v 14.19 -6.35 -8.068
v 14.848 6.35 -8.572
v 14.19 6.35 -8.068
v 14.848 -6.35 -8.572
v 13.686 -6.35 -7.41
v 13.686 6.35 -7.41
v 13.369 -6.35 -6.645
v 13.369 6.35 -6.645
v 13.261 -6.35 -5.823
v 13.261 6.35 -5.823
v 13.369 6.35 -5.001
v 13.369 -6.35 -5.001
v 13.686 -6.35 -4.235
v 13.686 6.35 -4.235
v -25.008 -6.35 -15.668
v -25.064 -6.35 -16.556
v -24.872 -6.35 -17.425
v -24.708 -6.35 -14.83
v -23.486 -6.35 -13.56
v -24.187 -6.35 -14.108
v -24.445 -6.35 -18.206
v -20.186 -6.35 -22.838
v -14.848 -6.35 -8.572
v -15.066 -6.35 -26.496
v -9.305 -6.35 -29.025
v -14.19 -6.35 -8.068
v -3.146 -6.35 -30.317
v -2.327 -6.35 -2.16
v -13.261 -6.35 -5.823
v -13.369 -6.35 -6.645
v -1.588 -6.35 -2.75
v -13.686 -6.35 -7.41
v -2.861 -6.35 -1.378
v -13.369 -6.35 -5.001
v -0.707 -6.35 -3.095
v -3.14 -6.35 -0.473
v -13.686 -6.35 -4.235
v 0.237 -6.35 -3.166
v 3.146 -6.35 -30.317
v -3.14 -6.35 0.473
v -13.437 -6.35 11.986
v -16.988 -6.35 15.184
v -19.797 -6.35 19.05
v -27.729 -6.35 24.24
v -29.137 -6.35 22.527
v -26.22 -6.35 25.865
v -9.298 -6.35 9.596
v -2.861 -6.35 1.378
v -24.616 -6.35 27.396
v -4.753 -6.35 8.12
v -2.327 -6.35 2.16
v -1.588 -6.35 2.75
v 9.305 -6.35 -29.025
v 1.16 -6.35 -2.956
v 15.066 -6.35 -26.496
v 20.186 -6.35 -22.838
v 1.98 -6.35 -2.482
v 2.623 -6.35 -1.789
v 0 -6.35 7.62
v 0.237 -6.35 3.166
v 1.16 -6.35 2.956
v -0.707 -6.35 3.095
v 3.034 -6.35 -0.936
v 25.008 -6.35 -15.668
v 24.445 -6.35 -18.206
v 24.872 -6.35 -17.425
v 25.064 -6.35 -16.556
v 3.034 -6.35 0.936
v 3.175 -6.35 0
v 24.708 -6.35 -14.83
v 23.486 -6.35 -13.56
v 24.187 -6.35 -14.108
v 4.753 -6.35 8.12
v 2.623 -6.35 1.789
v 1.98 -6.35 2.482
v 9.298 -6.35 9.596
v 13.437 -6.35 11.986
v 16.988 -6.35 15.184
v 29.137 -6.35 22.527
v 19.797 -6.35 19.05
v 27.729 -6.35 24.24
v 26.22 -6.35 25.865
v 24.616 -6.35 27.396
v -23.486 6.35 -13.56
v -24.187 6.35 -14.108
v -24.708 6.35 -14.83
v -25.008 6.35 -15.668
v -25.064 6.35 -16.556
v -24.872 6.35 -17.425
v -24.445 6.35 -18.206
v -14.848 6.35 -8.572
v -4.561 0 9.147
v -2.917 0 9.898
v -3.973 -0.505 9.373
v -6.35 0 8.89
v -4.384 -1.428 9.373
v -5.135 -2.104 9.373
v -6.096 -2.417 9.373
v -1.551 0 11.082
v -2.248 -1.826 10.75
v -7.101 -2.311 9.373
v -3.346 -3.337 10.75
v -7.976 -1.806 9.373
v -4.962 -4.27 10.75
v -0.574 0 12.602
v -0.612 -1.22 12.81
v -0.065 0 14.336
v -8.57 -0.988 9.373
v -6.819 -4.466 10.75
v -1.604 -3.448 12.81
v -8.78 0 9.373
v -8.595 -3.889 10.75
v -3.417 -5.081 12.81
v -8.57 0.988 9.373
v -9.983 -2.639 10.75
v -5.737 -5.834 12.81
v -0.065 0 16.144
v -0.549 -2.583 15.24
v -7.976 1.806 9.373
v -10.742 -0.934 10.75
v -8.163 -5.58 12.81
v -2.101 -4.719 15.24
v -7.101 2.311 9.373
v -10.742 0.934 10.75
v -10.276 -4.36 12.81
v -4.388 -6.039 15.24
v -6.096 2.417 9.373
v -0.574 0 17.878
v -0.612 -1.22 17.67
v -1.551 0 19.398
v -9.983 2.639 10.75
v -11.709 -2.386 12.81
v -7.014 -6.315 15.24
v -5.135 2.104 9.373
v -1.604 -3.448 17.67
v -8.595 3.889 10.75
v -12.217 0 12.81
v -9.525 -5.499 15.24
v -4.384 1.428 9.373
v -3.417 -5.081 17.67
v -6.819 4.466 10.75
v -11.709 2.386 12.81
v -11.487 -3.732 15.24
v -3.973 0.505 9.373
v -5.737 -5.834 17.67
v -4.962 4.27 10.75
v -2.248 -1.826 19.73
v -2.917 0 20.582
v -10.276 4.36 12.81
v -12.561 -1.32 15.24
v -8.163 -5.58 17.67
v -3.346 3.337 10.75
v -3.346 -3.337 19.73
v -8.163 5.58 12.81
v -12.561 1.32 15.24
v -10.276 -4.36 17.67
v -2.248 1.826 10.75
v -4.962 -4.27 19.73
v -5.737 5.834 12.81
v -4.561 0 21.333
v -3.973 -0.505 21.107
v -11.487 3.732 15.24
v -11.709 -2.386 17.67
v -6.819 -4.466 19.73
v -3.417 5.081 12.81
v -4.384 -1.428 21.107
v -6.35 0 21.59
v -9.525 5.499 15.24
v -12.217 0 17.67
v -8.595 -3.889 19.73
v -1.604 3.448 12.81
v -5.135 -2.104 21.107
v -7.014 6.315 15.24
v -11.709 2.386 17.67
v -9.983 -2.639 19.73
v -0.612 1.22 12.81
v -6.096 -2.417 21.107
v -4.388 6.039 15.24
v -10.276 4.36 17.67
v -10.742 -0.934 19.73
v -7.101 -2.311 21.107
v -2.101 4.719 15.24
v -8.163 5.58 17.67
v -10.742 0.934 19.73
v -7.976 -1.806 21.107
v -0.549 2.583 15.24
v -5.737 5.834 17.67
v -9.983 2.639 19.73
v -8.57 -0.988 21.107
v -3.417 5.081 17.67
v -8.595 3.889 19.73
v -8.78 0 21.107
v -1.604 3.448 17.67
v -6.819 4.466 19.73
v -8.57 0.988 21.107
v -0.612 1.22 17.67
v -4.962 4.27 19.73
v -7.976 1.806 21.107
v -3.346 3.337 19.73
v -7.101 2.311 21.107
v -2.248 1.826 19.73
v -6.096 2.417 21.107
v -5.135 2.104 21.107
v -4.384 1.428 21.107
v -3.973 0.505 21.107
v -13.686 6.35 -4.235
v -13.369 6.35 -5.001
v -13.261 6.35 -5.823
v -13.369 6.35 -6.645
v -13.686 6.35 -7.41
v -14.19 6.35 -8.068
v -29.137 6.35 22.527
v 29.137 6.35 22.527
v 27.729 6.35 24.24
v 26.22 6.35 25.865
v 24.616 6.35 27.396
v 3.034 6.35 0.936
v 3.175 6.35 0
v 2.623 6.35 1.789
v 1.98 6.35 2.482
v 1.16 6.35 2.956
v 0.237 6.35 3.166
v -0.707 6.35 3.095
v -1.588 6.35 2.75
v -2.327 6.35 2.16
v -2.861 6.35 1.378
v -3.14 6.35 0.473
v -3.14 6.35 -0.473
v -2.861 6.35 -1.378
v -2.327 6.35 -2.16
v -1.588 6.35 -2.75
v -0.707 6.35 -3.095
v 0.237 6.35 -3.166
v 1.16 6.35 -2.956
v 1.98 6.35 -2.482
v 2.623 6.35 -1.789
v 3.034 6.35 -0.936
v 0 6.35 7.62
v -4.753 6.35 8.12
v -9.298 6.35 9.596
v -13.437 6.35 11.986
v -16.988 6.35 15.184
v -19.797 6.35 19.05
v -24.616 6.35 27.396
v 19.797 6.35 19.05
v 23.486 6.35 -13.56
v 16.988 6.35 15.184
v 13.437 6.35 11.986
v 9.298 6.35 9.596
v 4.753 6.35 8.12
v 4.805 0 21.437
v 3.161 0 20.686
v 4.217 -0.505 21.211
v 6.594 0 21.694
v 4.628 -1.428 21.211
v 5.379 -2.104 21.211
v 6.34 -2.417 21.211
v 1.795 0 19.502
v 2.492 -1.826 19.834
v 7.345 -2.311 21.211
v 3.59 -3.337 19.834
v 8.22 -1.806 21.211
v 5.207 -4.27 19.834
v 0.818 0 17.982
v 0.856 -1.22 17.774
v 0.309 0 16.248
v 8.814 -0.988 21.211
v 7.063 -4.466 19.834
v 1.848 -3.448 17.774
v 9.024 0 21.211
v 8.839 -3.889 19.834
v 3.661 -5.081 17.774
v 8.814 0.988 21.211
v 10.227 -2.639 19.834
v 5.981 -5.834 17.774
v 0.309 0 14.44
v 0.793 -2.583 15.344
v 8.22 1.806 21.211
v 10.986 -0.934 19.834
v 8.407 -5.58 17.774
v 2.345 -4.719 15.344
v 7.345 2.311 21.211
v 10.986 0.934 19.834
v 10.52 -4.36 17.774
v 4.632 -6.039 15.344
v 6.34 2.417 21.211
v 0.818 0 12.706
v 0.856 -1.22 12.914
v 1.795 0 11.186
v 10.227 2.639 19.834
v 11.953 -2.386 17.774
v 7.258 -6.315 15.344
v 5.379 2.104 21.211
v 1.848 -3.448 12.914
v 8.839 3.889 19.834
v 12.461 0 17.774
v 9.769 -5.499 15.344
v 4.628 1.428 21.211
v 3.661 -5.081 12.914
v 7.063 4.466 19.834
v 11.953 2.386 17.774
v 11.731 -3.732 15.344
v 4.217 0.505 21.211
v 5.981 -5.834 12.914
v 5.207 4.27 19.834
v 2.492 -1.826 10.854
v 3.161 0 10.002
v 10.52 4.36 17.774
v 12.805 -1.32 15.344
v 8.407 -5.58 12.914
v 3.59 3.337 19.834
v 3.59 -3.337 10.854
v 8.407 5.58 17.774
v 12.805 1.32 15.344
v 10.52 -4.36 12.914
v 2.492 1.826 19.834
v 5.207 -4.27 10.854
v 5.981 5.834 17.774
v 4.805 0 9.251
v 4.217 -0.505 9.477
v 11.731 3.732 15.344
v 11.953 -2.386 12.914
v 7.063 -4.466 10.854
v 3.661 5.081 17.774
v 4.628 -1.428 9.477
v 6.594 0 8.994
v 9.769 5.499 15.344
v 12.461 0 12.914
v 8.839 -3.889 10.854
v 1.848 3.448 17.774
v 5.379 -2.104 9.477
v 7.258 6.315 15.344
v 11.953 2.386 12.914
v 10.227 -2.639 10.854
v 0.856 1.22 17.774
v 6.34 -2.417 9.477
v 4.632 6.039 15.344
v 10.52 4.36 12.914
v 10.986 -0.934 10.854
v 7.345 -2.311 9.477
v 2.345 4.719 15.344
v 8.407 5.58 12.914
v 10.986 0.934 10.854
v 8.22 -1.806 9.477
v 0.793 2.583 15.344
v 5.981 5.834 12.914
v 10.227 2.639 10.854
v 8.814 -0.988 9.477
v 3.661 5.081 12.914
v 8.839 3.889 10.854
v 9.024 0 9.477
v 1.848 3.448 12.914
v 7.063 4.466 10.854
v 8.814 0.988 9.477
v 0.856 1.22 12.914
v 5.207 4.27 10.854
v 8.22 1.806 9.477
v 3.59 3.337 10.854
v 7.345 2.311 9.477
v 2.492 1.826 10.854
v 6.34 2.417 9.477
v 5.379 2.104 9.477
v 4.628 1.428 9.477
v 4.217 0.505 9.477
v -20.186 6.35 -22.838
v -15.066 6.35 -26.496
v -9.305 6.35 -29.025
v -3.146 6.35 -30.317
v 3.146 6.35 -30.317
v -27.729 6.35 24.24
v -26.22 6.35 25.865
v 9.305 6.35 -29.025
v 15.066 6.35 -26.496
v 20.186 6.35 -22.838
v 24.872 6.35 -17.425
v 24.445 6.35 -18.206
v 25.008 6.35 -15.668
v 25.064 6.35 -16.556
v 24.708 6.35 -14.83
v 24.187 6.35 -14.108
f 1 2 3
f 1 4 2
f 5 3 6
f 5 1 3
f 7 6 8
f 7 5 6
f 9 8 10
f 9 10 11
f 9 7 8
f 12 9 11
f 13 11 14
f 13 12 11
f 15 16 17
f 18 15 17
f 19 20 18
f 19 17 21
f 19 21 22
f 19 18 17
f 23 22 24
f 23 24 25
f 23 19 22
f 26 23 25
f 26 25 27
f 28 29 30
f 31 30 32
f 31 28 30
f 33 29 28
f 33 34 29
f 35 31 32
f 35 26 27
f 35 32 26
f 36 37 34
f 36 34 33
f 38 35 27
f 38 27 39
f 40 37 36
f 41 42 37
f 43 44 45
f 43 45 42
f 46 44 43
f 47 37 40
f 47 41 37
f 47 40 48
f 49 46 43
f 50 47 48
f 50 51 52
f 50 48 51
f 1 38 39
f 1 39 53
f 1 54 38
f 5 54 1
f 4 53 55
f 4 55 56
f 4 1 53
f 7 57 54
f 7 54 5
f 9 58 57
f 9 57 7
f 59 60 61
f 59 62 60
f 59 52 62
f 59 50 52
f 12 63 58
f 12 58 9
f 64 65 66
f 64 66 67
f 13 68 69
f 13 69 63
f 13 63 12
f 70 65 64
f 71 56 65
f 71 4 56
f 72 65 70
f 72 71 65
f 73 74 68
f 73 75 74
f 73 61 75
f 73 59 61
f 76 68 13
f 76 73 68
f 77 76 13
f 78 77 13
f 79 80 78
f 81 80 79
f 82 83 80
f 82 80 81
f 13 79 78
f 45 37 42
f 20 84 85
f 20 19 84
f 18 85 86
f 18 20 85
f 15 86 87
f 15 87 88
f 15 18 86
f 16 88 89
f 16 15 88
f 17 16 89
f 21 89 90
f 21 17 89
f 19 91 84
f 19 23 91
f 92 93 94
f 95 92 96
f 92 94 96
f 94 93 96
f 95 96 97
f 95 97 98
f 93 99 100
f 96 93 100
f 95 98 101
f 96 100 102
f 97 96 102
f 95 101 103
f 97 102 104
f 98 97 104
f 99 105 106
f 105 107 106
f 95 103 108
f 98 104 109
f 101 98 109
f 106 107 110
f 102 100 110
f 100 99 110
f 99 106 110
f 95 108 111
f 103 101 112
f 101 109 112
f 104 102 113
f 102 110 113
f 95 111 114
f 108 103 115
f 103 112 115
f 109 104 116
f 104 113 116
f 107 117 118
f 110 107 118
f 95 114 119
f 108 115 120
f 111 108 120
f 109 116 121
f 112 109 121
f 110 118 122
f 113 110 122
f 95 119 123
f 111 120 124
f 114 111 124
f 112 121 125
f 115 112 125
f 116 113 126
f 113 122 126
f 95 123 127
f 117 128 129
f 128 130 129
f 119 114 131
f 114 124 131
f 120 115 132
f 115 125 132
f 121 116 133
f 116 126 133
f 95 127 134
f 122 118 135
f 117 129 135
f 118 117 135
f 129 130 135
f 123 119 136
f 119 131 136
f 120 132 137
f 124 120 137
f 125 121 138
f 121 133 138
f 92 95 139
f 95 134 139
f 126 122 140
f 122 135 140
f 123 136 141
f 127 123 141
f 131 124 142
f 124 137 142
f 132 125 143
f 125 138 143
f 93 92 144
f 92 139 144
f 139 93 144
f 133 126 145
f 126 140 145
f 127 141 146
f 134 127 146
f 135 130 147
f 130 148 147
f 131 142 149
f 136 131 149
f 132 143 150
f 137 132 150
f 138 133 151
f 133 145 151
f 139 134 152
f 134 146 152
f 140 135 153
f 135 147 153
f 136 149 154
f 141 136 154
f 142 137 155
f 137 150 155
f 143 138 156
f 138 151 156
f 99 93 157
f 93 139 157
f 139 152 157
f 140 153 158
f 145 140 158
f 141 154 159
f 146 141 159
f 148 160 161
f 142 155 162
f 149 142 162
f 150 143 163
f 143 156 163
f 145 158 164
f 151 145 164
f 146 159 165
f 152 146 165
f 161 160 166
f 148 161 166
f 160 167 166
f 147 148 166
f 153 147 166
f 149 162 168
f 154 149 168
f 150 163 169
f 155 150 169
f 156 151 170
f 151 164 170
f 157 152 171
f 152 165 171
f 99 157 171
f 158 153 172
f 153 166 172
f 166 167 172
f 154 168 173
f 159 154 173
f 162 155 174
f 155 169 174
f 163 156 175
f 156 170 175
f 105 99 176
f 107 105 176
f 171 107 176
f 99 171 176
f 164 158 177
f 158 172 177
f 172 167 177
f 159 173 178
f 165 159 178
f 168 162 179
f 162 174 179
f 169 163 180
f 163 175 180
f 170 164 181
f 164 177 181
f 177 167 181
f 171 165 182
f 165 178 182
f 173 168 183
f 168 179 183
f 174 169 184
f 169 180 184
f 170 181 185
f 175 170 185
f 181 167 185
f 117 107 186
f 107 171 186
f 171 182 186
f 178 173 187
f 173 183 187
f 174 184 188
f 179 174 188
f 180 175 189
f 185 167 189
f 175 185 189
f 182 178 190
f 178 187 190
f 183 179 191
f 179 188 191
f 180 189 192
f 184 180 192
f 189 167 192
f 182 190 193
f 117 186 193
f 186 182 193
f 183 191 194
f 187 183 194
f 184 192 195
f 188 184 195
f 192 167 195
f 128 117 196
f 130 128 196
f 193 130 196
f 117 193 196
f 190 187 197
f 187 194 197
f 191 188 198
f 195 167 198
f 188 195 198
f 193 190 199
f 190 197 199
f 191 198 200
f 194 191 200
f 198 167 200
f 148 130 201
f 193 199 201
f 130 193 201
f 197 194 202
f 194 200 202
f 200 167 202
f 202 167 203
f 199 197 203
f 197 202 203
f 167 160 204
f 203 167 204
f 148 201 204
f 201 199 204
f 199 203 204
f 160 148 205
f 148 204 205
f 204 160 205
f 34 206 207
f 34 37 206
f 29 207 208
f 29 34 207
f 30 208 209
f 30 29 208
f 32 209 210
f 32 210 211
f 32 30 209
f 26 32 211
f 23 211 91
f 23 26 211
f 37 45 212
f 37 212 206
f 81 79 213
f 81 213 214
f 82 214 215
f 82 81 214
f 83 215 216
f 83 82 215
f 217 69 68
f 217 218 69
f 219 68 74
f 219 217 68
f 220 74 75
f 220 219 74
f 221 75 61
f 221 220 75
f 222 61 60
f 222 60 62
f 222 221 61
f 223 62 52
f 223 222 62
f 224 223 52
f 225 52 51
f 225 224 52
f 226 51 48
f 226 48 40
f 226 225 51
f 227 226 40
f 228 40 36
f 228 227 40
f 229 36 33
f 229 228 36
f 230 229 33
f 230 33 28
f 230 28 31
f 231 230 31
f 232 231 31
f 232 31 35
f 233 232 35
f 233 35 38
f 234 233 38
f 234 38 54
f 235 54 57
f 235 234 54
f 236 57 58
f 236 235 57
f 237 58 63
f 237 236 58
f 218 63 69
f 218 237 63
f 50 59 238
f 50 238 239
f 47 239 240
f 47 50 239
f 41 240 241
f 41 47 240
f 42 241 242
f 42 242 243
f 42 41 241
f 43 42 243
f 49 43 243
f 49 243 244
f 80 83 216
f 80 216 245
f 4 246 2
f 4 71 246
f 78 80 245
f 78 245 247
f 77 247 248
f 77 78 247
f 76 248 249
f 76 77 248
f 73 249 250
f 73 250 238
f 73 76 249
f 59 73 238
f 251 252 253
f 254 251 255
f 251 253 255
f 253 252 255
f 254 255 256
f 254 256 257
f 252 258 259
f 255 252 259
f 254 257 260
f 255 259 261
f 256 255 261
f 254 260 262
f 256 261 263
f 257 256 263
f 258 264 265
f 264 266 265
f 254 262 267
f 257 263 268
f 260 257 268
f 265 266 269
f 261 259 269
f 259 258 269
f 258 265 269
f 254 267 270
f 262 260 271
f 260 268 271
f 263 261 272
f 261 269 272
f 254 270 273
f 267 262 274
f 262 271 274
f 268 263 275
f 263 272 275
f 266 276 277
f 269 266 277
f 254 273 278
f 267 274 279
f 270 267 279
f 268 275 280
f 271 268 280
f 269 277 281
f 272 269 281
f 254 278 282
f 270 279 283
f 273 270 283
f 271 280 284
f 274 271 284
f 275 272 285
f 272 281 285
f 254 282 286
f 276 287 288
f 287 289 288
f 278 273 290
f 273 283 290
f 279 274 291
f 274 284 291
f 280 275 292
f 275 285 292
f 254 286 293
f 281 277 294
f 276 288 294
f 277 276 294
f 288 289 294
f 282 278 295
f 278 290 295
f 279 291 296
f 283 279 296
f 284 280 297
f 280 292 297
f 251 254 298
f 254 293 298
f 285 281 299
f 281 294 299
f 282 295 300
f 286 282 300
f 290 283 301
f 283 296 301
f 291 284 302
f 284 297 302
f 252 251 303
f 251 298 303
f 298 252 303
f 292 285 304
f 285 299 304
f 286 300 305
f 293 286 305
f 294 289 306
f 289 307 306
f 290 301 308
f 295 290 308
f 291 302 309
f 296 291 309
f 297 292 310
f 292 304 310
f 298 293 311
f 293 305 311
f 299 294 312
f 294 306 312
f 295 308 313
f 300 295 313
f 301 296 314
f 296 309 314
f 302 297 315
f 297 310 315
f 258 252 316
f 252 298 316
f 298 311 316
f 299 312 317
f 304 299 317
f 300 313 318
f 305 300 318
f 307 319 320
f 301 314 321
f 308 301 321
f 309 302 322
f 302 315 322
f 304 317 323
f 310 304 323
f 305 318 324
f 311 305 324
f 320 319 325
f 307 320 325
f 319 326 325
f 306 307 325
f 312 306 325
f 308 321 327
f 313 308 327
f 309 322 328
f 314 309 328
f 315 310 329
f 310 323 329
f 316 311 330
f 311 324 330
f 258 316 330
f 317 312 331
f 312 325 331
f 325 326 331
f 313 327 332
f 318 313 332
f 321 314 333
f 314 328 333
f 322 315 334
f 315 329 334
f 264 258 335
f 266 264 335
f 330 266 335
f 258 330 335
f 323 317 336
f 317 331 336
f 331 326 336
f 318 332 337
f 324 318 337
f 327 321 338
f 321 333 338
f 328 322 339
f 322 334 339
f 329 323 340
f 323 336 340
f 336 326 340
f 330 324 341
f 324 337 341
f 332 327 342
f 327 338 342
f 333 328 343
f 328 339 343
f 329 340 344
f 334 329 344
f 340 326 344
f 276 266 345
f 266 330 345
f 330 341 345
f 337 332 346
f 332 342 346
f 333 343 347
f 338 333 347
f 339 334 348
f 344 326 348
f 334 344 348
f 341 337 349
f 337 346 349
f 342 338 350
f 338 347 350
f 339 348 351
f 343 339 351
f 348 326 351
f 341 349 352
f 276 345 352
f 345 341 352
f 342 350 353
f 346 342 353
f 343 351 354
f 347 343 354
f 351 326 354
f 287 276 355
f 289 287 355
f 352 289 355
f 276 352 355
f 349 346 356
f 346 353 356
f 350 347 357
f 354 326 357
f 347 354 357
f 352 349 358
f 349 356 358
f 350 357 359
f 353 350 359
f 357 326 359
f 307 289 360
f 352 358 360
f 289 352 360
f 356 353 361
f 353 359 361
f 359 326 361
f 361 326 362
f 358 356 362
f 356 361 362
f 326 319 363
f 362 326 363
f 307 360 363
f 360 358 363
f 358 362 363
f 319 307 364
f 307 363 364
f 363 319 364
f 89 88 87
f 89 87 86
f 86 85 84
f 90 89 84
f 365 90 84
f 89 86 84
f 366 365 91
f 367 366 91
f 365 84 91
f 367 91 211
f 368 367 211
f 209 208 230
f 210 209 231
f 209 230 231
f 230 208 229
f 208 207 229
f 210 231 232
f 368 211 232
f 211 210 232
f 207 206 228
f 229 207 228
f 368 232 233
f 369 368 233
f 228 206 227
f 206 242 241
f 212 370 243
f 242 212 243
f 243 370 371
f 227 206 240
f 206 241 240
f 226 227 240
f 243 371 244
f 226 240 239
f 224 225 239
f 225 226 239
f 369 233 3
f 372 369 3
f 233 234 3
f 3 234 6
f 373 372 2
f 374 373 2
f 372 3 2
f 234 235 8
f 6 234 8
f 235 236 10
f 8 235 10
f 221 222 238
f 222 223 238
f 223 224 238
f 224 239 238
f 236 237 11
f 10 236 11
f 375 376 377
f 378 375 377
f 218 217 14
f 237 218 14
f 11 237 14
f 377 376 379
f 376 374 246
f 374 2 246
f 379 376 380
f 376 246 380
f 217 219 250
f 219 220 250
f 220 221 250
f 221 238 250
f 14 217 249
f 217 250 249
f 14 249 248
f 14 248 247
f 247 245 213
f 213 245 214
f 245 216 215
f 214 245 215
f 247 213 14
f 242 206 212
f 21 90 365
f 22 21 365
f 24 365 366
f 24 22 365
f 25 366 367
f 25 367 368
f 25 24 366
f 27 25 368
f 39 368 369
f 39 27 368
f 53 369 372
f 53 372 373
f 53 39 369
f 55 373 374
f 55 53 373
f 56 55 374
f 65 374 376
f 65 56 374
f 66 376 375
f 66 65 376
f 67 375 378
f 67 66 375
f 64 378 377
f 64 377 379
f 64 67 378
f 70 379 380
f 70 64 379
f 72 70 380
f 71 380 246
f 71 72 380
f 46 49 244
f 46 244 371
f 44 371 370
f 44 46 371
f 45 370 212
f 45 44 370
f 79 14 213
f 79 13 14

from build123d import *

# Parameters (mm, degrees)
F0_R     = 3.175
F1_DEPTH = 6.35


with BuildPart() as f1:
    # F0 (on Front) → F1 (new body, symmetric)
    with BuildSketch(Plane.XZ):
        with BuildLine():
            Line((13.685875, -4.235369), (29.137213, 22.527133))
            ThreePointArc((29.137213, 22.527133), (26.986449, 25.063529), (24.615665, 27.395582))
            Line((24.615665, 27.395582), (19.797341, 19.05))
            ThreePointArc((19.797341, 19.05), (11.43, 10.682659), (0, 7.62))
            ThreePointArc((0, 7.62), (-11.43, 10.682659), (-19.797341, 19.05))
            Line((-19.797341, 19.05), (-24.615665, 27.395582))
            ThreePointArc((-24.615665, 27.395582), (-26.986449, 25.063529), (-29.137213, 22.527133))
            Line((-29.137213, 22.527133), (-13.685875, -4.235369))
            ThreePointArc((-13.685875, -4.235369), (-13.368691, -6.64462), (-14.848006, -8.5725))
            Line((-14.848006, -8.5725), (-23.486417, -13.559889))
            ThreePointArc((-23.486417, -13.559889), (-25.008384, -15.667771), (-24.445303, -18.205976))
            ThreePointArc((-24.445303, -18.205976), (0, -30.48), (24.445303, -18.205976))
            ThreePointArc((24.445303, -18.205976), (25.008384, -15.667771), (23.486417, -13.559889))
            Line((23.486417, -13.559889), (14.848006, -8.5725))
            ThreePointArc((14.848006, -8.5725), (13.368691, -6.64462), (13.685875, -4.235369))
        make_face()
        Circle(F0_R, mode=Mode.SUBTRACT)
    extrude(amount=F1_DEPTH, both=True)


with BuildPart() as f3:
    # F2 (on Front) → F3 (revolve)
    with BuildSketch(Plane.XZ):
        with BuildLine():
            Line((6.594034, 8.99399), (6.594034, 21.69399))
            ThreePointArc((6.594034, 21.69399), (0.244034, 15.34399), (6.594034, 8.99399))
        make_face()
    revolve(axis=Axis((6.594034, 0, 15.34399), (0, 0, 1)))


with BuildPart() as f5:
    # F4 (on Front) → F5 (revolve)
    with BuildSketch(Plane.XZ):
        with BuildLine():
            Line((-6.35, 21.59), (-6.35, 8.89))
            ThreePointArc((-6.35, 8.89), (0, 15.24), (-6.35, 21.59))
        make_face()
    revolve(axis=Axis((-6.35, 0, 15.24), (0, 0, -1)))


solid = Compound([f1.part, f3.part, f5.part])
